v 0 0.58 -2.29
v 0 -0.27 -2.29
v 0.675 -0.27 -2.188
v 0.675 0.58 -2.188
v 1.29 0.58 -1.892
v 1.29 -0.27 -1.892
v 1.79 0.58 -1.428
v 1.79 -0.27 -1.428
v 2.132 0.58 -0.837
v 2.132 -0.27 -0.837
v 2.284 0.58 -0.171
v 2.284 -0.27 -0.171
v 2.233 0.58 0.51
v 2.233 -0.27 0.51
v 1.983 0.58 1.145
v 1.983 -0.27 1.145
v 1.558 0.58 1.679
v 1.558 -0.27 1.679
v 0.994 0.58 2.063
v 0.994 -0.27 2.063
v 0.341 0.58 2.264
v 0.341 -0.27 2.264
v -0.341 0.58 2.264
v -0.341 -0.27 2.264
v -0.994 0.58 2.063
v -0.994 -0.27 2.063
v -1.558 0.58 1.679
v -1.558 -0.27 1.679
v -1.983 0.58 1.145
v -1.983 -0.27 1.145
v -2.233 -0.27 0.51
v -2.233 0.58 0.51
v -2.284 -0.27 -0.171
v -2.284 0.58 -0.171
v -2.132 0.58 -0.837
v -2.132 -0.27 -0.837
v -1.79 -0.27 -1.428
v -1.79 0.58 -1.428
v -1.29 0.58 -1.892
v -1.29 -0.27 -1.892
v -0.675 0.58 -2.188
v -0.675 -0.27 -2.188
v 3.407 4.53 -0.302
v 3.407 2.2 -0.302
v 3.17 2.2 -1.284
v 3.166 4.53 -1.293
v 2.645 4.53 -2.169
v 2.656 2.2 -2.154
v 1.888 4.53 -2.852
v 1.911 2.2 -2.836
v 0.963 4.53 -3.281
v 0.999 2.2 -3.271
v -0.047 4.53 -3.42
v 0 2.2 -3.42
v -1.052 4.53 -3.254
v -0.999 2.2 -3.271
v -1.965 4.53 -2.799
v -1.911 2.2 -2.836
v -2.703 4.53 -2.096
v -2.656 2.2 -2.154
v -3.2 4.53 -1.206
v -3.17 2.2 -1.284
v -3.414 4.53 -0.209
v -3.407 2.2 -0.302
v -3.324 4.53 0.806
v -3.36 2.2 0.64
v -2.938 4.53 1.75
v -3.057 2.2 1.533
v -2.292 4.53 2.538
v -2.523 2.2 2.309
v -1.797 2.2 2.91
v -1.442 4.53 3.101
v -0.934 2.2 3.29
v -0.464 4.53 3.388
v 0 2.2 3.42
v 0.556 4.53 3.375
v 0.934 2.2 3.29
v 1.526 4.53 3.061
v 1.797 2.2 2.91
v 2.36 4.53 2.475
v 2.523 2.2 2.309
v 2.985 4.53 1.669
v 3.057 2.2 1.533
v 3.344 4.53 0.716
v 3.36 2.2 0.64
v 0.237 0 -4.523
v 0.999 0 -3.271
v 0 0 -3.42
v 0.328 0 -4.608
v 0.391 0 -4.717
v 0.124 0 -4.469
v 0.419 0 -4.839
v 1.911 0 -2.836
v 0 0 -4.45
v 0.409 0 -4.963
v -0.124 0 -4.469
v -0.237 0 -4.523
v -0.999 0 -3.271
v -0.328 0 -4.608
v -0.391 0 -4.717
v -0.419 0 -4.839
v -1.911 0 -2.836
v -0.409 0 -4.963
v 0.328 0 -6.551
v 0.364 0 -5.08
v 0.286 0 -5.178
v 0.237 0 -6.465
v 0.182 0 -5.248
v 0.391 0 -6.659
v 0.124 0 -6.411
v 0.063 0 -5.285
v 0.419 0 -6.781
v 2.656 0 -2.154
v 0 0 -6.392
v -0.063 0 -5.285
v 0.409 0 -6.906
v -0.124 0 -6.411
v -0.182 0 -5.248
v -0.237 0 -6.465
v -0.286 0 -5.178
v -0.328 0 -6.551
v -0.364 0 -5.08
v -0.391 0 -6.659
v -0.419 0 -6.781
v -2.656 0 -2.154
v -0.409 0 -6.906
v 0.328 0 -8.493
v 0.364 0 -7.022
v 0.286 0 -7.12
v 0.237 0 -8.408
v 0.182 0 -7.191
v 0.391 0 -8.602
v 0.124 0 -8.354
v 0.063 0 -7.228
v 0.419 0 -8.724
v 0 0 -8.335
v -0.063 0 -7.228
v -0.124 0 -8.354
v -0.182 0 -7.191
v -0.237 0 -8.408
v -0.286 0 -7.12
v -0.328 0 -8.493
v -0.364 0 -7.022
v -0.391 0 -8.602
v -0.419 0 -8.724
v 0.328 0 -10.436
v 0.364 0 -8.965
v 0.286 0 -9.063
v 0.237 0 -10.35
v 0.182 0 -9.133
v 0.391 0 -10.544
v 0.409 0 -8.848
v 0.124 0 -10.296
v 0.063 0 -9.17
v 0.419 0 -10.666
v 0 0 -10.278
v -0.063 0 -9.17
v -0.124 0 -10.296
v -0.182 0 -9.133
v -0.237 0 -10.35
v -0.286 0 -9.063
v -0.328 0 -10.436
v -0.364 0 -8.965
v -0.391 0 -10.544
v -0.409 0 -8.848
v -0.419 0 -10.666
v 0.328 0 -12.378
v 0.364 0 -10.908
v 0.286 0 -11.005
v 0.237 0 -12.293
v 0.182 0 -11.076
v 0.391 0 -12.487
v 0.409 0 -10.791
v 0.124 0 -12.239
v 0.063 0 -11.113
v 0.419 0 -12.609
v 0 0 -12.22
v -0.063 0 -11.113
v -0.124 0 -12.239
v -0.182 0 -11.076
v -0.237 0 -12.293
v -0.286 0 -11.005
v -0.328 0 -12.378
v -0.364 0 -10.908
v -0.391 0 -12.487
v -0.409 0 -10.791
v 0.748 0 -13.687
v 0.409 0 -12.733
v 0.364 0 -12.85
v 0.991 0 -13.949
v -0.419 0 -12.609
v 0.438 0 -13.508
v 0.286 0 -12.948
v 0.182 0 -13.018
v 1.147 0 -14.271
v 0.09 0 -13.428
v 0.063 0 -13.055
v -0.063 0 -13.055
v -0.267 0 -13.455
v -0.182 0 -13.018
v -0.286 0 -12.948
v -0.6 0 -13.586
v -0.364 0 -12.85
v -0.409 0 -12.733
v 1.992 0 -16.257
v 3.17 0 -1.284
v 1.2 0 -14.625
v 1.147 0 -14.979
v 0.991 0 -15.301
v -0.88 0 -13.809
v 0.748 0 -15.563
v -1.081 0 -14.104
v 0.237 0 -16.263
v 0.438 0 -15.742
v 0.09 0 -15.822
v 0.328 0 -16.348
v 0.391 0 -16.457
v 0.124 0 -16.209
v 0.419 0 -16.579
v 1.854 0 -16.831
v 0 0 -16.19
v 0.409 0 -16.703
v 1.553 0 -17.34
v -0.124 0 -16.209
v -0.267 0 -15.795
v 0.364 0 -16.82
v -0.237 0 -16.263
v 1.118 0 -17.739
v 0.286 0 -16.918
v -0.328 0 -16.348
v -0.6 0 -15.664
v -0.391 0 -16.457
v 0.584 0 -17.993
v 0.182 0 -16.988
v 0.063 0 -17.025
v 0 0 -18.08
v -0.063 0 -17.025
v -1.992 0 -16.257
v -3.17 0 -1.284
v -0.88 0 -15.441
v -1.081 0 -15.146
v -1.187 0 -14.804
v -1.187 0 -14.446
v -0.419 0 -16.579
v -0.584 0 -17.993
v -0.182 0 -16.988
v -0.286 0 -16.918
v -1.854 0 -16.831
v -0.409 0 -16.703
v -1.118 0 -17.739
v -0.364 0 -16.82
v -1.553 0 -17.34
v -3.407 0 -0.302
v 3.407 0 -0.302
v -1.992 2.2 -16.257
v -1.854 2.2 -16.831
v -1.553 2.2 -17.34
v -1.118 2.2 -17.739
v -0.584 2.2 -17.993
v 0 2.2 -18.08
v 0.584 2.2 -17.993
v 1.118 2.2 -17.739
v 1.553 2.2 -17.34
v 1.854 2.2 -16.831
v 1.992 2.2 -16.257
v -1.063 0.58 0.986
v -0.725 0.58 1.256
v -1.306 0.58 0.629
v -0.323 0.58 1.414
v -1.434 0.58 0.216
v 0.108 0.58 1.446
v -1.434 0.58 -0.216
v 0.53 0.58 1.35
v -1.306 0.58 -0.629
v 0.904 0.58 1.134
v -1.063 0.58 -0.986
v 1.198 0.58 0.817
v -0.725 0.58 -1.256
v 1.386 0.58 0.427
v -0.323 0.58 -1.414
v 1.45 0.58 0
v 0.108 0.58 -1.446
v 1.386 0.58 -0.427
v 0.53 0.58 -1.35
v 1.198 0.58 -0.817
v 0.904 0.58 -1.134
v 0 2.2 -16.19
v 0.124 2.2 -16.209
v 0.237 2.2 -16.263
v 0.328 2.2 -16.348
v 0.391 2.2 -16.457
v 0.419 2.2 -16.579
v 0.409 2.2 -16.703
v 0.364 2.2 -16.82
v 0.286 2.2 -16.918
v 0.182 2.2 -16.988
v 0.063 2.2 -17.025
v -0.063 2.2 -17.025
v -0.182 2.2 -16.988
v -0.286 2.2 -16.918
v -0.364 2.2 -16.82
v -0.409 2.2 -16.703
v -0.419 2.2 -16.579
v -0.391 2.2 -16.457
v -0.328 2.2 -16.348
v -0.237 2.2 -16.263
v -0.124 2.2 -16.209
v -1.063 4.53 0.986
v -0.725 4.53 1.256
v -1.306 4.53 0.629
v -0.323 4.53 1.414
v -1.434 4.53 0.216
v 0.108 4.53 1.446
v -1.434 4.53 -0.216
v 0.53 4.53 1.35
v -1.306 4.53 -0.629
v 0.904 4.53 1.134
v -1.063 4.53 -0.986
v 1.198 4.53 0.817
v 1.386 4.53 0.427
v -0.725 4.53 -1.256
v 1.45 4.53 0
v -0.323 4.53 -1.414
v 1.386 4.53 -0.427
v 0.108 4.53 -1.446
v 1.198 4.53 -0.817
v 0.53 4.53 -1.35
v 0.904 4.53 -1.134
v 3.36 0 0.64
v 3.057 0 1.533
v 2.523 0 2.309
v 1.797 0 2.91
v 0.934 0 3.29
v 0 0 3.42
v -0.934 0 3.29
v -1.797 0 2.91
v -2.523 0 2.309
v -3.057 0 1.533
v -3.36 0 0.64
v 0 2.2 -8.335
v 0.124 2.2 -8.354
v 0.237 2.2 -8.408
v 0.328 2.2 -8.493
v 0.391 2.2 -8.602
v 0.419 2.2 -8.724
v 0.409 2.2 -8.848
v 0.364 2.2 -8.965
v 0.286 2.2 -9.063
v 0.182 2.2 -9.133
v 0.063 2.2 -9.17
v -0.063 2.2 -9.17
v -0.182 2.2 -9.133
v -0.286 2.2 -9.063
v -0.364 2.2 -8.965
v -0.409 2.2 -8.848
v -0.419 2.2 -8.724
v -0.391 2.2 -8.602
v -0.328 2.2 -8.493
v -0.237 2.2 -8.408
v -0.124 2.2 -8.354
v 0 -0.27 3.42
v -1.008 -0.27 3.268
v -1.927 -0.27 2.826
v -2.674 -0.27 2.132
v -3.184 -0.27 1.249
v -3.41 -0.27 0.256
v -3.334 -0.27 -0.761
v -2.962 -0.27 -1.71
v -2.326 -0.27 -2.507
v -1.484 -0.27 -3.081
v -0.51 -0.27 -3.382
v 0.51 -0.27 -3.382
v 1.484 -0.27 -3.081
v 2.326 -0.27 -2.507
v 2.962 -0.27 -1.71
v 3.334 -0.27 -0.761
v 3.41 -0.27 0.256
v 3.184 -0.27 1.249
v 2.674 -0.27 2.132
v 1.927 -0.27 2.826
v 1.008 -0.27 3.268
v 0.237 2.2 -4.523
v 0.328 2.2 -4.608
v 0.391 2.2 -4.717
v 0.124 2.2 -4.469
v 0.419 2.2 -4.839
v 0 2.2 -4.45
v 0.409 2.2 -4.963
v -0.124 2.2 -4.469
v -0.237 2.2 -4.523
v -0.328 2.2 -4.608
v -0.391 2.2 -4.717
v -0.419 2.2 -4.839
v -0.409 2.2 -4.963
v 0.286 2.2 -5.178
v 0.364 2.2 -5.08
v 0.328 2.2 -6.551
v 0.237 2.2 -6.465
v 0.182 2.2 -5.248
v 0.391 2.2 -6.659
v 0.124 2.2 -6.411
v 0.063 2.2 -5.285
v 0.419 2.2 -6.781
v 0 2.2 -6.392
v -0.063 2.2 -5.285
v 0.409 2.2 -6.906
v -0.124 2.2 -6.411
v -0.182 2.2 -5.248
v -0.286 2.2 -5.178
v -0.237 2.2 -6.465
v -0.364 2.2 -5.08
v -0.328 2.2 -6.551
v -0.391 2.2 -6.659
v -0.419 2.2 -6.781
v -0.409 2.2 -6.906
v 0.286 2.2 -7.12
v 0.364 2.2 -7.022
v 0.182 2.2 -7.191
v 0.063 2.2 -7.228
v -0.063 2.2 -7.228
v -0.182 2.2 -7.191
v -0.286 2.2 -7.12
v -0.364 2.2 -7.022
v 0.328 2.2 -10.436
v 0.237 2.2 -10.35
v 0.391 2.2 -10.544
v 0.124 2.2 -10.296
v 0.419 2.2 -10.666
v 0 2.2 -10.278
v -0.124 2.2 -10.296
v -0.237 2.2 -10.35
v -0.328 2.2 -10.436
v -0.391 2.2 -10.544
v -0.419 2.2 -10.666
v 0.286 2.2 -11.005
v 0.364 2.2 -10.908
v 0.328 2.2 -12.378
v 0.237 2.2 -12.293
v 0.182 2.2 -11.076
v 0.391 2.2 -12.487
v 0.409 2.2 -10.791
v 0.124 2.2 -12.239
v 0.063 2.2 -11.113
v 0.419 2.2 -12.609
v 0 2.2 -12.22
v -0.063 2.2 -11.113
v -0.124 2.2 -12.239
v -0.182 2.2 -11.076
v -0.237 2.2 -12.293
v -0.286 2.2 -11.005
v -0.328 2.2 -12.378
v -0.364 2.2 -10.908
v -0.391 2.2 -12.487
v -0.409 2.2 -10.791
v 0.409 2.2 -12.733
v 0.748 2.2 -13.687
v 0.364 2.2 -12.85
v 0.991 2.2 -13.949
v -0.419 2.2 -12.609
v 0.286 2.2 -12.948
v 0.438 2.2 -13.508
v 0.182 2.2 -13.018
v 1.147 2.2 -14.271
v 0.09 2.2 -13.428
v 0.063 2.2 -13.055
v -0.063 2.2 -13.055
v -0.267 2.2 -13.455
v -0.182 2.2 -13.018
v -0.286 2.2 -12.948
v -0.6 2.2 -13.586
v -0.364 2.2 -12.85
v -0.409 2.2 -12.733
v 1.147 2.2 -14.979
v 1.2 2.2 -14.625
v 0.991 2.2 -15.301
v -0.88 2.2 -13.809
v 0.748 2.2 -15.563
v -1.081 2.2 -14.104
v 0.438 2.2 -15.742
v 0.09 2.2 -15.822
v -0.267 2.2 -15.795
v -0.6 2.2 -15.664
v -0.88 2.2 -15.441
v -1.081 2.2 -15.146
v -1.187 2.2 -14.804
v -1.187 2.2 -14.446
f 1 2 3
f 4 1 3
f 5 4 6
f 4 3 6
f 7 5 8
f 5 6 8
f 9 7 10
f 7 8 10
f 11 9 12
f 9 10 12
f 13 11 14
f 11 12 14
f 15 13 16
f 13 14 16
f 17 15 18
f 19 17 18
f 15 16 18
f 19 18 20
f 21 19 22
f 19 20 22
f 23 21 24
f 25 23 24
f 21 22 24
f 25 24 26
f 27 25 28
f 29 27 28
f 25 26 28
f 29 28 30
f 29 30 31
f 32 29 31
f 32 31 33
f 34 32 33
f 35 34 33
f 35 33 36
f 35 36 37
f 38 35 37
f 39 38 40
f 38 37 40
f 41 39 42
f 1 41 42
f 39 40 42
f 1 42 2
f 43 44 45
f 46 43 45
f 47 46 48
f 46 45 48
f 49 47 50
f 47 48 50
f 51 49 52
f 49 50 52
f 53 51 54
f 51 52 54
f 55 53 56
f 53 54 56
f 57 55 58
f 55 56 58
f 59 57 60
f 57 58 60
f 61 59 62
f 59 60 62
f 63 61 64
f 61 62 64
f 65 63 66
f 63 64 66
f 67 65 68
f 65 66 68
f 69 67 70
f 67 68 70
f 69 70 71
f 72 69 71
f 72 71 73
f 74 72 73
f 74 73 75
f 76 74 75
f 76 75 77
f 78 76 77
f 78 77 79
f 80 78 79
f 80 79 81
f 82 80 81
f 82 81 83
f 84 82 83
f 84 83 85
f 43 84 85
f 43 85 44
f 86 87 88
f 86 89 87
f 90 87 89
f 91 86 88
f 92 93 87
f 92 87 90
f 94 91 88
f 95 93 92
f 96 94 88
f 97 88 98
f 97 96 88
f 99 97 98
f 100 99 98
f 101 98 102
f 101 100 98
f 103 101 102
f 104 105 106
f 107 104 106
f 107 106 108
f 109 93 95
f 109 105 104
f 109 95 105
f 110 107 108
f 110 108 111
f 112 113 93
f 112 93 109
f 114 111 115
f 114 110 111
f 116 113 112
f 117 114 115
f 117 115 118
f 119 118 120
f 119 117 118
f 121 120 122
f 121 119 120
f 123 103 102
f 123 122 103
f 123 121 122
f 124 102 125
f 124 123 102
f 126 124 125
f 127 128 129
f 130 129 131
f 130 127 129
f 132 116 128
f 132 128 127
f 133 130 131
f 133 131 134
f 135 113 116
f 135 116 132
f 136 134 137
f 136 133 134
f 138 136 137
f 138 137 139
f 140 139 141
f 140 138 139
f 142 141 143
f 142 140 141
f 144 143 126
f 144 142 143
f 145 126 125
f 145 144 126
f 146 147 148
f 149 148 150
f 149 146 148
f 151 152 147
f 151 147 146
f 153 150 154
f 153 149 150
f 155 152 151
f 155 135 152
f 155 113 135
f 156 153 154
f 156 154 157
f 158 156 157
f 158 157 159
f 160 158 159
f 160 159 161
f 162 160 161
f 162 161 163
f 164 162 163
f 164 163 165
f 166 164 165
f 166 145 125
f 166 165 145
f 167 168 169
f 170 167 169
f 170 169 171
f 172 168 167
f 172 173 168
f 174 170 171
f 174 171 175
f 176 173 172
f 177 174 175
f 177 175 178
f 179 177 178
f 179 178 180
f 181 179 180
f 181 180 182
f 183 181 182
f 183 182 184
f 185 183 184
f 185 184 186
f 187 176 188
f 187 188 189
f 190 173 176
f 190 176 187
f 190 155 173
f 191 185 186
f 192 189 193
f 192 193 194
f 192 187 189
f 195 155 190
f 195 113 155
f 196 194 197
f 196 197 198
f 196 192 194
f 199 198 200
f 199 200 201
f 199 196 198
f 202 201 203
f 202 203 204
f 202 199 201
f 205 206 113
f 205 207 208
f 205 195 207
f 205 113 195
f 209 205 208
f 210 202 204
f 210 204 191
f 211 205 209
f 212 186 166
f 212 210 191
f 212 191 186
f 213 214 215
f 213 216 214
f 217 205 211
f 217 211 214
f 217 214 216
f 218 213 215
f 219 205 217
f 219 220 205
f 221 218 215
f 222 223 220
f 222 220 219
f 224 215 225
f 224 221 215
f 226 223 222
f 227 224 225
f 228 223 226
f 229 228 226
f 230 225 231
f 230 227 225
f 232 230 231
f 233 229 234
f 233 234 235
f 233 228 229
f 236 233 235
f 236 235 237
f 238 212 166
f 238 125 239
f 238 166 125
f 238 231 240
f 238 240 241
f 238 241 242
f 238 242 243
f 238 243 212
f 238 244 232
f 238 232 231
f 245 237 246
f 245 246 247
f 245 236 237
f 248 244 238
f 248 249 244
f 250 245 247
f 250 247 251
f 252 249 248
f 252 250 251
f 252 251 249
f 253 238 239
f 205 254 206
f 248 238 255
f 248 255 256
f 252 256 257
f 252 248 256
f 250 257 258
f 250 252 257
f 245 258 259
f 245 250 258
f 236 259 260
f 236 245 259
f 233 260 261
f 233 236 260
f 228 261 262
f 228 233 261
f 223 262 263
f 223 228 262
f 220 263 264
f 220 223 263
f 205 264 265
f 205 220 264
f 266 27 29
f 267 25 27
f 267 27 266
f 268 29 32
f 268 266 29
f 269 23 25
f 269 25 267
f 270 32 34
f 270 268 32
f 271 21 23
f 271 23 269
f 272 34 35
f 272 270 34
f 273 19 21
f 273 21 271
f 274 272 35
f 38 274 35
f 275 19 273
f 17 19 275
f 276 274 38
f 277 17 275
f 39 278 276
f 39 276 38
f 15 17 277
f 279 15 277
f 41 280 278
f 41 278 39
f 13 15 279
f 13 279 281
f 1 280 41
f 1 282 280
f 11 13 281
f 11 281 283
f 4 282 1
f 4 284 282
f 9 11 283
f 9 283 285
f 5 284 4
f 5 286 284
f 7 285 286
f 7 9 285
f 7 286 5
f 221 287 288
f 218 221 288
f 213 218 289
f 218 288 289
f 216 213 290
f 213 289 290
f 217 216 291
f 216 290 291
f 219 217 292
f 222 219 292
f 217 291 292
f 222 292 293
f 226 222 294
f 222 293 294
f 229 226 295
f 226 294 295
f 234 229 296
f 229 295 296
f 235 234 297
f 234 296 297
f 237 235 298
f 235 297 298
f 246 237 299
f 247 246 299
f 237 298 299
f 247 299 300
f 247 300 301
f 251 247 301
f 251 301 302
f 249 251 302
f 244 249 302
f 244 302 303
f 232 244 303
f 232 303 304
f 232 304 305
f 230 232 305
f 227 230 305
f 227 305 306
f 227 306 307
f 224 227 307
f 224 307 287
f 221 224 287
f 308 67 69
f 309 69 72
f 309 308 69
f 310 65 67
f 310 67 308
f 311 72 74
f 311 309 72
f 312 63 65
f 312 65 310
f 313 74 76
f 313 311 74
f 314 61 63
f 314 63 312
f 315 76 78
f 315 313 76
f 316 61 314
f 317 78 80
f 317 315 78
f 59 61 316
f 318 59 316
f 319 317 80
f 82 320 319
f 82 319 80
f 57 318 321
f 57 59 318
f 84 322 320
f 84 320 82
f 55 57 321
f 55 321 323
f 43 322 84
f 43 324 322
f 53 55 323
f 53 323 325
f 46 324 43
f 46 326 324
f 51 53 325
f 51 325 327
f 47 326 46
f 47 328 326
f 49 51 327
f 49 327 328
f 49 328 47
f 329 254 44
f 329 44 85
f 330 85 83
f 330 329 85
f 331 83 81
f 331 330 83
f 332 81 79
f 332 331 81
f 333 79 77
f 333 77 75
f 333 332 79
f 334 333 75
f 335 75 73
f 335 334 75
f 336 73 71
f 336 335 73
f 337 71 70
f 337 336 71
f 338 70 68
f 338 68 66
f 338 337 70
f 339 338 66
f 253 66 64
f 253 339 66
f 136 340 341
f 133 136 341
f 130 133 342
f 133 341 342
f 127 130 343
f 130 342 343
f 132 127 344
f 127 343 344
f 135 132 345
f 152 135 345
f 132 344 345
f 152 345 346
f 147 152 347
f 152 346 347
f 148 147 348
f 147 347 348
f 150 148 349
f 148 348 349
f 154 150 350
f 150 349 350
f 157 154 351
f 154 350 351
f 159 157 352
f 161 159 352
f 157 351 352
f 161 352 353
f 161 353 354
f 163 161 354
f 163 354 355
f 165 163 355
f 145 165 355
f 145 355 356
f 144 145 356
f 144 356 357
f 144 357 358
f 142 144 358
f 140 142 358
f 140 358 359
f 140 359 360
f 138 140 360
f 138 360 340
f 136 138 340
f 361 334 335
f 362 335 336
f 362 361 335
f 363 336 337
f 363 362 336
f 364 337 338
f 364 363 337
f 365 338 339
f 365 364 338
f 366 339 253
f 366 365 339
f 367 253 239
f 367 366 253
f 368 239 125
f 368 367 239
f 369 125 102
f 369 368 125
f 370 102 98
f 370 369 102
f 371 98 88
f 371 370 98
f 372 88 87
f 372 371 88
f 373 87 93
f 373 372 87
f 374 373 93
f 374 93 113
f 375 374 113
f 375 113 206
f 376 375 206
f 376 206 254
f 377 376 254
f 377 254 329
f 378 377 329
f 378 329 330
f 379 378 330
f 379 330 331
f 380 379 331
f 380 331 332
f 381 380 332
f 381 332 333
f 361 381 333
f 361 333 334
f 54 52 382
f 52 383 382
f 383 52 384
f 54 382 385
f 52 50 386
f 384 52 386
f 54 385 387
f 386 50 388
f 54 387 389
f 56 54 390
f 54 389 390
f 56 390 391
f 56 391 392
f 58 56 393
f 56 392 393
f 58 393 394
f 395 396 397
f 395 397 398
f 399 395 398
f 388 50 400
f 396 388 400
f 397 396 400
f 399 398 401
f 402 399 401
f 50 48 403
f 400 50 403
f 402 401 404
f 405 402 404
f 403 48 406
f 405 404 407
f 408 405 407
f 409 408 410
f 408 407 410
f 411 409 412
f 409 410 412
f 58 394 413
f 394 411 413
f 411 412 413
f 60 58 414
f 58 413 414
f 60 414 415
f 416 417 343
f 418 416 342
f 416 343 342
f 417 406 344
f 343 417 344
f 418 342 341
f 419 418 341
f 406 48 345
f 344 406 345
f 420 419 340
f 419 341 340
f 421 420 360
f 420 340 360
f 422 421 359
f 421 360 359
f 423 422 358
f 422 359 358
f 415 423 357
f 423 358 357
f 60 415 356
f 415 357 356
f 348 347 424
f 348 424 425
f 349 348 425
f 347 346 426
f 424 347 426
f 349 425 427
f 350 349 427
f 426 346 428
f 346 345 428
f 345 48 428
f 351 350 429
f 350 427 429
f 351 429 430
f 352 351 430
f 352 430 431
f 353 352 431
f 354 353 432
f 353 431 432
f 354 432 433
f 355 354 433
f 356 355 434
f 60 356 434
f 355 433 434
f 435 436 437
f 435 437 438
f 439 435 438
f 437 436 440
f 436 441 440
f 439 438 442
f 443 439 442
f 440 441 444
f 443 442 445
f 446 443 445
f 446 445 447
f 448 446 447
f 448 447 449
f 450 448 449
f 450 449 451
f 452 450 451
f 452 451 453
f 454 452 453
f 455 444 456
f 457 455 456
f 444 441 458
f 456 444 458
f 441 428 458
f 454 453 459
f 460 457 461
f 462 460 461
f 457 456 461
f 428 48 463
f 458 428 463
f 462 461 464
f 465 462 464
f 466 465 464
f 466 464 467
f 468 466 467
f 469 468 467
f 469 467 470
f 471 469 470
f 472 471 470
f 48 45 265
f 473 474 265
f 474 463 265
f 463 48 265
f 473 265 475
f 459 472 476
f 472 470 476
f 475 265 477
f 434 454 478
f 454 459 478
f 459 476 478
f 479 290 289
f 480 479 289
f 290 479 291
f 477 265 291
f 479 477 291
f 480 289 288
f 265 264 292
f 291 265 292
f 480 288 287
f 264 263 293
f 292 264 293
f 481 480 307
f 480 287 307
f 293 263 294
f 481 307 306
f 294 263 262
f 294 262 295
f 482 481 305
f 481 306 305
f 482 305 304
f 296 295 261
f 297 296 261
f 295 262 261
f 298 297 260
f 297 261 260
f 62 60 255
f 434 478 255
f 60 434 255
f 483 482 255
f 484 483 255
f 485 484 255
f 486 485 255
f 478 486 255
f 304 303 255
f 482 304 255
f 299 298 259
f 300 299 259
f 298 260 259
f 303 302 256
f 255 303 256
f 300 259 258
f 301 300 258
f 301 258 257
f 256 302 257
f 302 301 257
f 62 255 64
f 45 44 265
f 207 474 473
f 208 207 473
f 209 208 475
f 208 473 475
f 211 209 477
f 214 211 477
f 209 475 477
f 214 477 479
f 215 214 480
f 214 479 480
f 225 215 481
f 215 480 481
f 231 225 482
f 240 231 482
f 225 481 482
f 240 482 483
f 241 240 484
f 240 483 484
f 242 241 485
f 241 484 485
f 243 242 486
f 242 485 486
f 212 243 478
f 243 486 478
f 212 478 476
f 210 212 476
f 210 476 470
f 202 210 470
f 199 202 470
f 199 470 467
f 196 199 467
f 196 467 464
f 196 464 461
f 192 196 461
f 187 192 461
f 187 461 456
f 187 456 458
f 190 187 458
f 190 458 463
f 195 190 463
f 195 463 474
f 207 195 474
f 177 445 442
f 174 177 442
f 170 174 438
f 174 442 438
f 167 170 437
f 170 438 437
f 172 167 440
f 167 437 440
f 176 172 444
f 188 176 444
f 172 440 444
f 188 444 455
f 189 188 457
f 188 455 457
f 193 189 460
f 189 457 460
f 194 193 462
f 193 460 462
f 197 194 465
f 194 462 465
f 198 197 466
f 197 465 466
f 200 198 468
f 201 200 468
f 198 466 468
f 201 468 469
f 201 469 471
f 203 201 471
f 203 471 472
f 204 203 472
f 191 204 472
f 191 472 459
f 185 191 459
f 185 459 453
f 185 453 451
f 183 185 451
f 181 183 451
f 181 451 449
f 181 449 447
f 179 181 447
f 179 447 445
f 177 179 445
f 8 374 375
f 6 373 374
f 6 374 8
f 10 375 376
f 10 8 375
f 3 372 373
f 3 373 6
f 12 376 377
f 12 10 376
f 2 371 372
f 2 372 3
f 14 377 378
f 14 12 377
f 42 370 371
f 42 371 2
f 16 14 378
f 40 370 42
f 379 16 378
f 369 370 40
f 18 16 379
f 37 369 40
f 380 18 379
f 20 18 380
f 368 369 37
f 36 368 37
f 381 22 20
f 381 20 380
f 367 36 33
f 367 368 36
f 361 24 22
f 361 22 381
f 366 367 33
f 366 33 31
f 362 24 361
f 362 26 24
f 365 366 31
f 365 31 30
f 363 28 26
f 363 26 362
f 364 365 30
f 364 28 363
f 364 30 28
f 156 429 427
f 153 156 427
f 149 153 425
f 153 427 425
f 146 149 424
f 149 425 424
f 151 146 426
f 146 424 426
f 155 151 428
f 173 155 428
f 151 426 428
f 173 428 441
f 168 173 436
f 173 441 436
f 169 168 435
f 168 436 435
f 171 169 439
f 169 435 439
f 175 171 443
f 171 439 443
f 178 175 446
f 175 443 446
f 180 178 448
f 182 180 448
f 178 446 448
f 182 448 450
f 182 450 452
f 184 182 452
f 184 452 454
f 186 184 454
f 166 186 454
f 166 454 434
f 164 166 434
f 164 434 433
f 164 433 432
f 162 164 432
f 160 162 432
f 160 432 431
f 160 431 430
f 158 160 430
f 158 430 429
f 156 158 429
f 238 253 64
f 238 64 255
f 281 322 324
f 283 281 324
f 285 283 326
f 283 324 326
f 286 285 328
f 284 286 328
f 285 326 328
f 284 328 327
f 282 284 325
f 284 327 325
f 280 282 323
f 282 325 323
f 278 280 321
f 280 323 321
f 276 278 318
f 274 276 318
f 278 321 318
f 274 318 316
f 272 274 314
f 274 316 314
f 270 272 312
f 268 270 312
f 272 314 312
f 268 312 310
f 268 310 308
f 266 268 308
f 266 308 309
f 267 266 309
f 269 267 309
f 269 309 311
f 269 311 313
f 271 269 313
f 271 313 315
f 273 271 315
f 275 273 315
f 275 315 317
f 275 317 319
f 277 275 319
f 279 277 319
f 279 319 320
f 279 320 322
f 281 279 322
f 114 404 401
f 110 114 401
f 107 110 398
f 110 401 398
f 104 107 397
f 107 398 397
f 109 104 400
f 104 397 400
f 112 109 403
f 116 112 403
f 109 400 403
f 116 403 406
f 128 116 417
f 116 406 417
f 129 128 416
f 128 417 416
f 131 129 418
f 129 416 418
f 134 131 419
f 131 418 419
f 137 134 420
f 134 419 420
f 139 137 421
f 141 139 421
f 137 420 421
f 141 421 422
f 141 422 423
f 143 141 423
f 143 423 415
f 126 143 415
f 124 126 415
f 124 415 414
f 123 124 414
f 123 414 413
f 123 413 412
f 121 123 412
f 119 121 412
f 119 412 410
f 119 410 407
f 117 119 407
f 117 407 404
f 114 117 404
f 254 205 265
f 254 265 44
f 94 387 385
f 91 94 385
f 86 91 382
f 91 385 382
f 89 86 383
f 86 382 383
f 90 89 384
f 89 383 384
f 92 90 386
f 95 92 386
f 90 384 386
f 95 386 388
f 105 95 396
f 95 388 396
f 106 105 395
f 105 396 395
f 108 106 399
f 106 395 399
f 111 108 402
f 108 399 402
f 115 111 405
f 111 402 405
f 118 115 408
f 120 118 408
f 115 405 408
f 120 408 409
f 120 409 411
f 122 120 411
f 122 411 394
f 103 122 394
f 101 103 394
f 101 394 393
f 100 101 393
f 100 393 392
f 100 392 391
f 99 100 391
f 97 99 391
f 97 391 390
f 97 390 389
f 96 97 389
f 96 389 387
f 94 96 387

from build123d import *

# Parameters (mm, degrees)
BOSS_EXTRUDE1_DEPTH    = 2.2
SKETCH2_R              = 3.42
BOSS_EXTRUDE2_DEPTH    = 2.33
SKETCH6_R              = 0.42
SKETCH6_R_2            = 0.7
CUT_EXTRUDE5_DEPTH     = 19.547552399
BOSS_EXTRUDE3_START    = 0.27
SKETCH9_R              = 3.42
BOSS_EXTRUDE3_DEPTH    = 0.27
SKETCH10_R             = 2.29
CUT_EXTRUDE12_DEPTH    = 0.85
M2_5_CLEARANCE_HOLE2_D = 2.9
M2_CLEARANCE_HOLE1_D   = 2.4


with BuildPart() as part:
    # Sketch1 → Boss-Extrude1 (new body)
    with BuildSketch(Plane(origin=(0, 0, 0), x_dir=(1, 0, 0), z_dir=(0, 1, 0))):
        with BuildLine():
            Line((-3.406638664, 0.302014925), (-1.992186353, 16.256616915))
            ThreePointArc((-1.992186353, 16.256616915), (0, 18.08), (1.992186353, 16.256616915))
            Line((1.992186353, 16.256616915), (3.406638664, 0.302014925))
            ThreePointArc((3.406638664, 0.302014925), (0, -3.42), (-3.406638664, 0.302014925))
        make_face()
    extrude(amount=BOSS_EXTRUDE1_DEPTH)

    # Sketch2 → Boss-Extrude2 (add)
    with BuildSketch(Plane(origin=(0, 2.2, 0), x_dir=(1, 0, 0), z_dir=(0, 1, 0))):
        with Locations(Location((0, 0, 0), (0, 0, 5.066301357))):
            Circle(SKETCH2_R)
    extrude(amount=BOSS_EXTRUDE2_DEPTH)

    # Sketch6 → Cut-Extrude5 (cut, through all)
    with BuildSketch(Plane(origin=(0, 2.2, 0), x_dir=(1, 0, 0), z_dir=(0, 1, 0))):
        with Locations(Location((0, 4.87, 0), (0, 0, 270))):
            Circle(SKETCH6_R)
        with Locations(Location((0, 6.8125, 0), (0, 0, 270))):
            Circle(SKETCH6_R)
        with Locations(Location((0, 8.755, 0), (0, 0, 270))):
            Circle(SKETCH6_R)
        with Locations(Location((0, 10.6975, 0), (0, 0, 270))):
            Circle(SKETCH6_R)
        with Locations(Location((0, 12.64, 0), (0, 0, 270))):
            Circle(SKETCH6_R)
        with Locations(Location((0, 14.625, 0), (0, 0, 270))):
            Circle(SKETCH6_R_2)
        with Locations(Location((0, 16.61, 0), (0, 0, 270))):
            Circle(SKETCH6_R)
    extrude(amount=-CUT_EXTRUDE5_DEPTH, mode=Mode.SUBTRACT)

    # Sketch9 → Boss-Extrude3 (add)
    with BuildSketch(Plane.XZ.offset(BOSS_EXTRUDE3_START)):
        with Locations(Location((0, 0, 0), (0, 0, 90))):
            Circle(SKETCH9_R)
    extrude(amount=-BOSS_EXTRUDE3_DEPTH)

    # Sketch10 → Cut-Extrude12 (cut)
    with BuildSketch(Plane.XZ.offset(0.27)):
        with Locations(Location((0, 0, 0), (0, 0, 270))):
            Circle(SKETCH10_R)
    extrude(amount=-CUT_EXTRUDE12_DEPTH, mode=Mode.SUBTRACT)

    # M2.5 Clearance Hole2 (through all)
    with Locations(Plane(origin=(0, 0.58, 0), x_dir=(-1, 0, 0), z_dir=(0, -1, 0))):
        with Locations((0, 0)):
            Hole(M2_5_CLEARANCE_HOLE2_D / 2)

    # M2 Clearance Hole1 (through all)
    with Locations(Plane(origin=(0, 0, 0), x_dir=(-1, 0, 0), z_dir=(0, -1, 0))):
        with Locations((0, 14.625)):
            Hole(M2_CLEARANCE_HOLE1_D / 2)


solid = part.part
